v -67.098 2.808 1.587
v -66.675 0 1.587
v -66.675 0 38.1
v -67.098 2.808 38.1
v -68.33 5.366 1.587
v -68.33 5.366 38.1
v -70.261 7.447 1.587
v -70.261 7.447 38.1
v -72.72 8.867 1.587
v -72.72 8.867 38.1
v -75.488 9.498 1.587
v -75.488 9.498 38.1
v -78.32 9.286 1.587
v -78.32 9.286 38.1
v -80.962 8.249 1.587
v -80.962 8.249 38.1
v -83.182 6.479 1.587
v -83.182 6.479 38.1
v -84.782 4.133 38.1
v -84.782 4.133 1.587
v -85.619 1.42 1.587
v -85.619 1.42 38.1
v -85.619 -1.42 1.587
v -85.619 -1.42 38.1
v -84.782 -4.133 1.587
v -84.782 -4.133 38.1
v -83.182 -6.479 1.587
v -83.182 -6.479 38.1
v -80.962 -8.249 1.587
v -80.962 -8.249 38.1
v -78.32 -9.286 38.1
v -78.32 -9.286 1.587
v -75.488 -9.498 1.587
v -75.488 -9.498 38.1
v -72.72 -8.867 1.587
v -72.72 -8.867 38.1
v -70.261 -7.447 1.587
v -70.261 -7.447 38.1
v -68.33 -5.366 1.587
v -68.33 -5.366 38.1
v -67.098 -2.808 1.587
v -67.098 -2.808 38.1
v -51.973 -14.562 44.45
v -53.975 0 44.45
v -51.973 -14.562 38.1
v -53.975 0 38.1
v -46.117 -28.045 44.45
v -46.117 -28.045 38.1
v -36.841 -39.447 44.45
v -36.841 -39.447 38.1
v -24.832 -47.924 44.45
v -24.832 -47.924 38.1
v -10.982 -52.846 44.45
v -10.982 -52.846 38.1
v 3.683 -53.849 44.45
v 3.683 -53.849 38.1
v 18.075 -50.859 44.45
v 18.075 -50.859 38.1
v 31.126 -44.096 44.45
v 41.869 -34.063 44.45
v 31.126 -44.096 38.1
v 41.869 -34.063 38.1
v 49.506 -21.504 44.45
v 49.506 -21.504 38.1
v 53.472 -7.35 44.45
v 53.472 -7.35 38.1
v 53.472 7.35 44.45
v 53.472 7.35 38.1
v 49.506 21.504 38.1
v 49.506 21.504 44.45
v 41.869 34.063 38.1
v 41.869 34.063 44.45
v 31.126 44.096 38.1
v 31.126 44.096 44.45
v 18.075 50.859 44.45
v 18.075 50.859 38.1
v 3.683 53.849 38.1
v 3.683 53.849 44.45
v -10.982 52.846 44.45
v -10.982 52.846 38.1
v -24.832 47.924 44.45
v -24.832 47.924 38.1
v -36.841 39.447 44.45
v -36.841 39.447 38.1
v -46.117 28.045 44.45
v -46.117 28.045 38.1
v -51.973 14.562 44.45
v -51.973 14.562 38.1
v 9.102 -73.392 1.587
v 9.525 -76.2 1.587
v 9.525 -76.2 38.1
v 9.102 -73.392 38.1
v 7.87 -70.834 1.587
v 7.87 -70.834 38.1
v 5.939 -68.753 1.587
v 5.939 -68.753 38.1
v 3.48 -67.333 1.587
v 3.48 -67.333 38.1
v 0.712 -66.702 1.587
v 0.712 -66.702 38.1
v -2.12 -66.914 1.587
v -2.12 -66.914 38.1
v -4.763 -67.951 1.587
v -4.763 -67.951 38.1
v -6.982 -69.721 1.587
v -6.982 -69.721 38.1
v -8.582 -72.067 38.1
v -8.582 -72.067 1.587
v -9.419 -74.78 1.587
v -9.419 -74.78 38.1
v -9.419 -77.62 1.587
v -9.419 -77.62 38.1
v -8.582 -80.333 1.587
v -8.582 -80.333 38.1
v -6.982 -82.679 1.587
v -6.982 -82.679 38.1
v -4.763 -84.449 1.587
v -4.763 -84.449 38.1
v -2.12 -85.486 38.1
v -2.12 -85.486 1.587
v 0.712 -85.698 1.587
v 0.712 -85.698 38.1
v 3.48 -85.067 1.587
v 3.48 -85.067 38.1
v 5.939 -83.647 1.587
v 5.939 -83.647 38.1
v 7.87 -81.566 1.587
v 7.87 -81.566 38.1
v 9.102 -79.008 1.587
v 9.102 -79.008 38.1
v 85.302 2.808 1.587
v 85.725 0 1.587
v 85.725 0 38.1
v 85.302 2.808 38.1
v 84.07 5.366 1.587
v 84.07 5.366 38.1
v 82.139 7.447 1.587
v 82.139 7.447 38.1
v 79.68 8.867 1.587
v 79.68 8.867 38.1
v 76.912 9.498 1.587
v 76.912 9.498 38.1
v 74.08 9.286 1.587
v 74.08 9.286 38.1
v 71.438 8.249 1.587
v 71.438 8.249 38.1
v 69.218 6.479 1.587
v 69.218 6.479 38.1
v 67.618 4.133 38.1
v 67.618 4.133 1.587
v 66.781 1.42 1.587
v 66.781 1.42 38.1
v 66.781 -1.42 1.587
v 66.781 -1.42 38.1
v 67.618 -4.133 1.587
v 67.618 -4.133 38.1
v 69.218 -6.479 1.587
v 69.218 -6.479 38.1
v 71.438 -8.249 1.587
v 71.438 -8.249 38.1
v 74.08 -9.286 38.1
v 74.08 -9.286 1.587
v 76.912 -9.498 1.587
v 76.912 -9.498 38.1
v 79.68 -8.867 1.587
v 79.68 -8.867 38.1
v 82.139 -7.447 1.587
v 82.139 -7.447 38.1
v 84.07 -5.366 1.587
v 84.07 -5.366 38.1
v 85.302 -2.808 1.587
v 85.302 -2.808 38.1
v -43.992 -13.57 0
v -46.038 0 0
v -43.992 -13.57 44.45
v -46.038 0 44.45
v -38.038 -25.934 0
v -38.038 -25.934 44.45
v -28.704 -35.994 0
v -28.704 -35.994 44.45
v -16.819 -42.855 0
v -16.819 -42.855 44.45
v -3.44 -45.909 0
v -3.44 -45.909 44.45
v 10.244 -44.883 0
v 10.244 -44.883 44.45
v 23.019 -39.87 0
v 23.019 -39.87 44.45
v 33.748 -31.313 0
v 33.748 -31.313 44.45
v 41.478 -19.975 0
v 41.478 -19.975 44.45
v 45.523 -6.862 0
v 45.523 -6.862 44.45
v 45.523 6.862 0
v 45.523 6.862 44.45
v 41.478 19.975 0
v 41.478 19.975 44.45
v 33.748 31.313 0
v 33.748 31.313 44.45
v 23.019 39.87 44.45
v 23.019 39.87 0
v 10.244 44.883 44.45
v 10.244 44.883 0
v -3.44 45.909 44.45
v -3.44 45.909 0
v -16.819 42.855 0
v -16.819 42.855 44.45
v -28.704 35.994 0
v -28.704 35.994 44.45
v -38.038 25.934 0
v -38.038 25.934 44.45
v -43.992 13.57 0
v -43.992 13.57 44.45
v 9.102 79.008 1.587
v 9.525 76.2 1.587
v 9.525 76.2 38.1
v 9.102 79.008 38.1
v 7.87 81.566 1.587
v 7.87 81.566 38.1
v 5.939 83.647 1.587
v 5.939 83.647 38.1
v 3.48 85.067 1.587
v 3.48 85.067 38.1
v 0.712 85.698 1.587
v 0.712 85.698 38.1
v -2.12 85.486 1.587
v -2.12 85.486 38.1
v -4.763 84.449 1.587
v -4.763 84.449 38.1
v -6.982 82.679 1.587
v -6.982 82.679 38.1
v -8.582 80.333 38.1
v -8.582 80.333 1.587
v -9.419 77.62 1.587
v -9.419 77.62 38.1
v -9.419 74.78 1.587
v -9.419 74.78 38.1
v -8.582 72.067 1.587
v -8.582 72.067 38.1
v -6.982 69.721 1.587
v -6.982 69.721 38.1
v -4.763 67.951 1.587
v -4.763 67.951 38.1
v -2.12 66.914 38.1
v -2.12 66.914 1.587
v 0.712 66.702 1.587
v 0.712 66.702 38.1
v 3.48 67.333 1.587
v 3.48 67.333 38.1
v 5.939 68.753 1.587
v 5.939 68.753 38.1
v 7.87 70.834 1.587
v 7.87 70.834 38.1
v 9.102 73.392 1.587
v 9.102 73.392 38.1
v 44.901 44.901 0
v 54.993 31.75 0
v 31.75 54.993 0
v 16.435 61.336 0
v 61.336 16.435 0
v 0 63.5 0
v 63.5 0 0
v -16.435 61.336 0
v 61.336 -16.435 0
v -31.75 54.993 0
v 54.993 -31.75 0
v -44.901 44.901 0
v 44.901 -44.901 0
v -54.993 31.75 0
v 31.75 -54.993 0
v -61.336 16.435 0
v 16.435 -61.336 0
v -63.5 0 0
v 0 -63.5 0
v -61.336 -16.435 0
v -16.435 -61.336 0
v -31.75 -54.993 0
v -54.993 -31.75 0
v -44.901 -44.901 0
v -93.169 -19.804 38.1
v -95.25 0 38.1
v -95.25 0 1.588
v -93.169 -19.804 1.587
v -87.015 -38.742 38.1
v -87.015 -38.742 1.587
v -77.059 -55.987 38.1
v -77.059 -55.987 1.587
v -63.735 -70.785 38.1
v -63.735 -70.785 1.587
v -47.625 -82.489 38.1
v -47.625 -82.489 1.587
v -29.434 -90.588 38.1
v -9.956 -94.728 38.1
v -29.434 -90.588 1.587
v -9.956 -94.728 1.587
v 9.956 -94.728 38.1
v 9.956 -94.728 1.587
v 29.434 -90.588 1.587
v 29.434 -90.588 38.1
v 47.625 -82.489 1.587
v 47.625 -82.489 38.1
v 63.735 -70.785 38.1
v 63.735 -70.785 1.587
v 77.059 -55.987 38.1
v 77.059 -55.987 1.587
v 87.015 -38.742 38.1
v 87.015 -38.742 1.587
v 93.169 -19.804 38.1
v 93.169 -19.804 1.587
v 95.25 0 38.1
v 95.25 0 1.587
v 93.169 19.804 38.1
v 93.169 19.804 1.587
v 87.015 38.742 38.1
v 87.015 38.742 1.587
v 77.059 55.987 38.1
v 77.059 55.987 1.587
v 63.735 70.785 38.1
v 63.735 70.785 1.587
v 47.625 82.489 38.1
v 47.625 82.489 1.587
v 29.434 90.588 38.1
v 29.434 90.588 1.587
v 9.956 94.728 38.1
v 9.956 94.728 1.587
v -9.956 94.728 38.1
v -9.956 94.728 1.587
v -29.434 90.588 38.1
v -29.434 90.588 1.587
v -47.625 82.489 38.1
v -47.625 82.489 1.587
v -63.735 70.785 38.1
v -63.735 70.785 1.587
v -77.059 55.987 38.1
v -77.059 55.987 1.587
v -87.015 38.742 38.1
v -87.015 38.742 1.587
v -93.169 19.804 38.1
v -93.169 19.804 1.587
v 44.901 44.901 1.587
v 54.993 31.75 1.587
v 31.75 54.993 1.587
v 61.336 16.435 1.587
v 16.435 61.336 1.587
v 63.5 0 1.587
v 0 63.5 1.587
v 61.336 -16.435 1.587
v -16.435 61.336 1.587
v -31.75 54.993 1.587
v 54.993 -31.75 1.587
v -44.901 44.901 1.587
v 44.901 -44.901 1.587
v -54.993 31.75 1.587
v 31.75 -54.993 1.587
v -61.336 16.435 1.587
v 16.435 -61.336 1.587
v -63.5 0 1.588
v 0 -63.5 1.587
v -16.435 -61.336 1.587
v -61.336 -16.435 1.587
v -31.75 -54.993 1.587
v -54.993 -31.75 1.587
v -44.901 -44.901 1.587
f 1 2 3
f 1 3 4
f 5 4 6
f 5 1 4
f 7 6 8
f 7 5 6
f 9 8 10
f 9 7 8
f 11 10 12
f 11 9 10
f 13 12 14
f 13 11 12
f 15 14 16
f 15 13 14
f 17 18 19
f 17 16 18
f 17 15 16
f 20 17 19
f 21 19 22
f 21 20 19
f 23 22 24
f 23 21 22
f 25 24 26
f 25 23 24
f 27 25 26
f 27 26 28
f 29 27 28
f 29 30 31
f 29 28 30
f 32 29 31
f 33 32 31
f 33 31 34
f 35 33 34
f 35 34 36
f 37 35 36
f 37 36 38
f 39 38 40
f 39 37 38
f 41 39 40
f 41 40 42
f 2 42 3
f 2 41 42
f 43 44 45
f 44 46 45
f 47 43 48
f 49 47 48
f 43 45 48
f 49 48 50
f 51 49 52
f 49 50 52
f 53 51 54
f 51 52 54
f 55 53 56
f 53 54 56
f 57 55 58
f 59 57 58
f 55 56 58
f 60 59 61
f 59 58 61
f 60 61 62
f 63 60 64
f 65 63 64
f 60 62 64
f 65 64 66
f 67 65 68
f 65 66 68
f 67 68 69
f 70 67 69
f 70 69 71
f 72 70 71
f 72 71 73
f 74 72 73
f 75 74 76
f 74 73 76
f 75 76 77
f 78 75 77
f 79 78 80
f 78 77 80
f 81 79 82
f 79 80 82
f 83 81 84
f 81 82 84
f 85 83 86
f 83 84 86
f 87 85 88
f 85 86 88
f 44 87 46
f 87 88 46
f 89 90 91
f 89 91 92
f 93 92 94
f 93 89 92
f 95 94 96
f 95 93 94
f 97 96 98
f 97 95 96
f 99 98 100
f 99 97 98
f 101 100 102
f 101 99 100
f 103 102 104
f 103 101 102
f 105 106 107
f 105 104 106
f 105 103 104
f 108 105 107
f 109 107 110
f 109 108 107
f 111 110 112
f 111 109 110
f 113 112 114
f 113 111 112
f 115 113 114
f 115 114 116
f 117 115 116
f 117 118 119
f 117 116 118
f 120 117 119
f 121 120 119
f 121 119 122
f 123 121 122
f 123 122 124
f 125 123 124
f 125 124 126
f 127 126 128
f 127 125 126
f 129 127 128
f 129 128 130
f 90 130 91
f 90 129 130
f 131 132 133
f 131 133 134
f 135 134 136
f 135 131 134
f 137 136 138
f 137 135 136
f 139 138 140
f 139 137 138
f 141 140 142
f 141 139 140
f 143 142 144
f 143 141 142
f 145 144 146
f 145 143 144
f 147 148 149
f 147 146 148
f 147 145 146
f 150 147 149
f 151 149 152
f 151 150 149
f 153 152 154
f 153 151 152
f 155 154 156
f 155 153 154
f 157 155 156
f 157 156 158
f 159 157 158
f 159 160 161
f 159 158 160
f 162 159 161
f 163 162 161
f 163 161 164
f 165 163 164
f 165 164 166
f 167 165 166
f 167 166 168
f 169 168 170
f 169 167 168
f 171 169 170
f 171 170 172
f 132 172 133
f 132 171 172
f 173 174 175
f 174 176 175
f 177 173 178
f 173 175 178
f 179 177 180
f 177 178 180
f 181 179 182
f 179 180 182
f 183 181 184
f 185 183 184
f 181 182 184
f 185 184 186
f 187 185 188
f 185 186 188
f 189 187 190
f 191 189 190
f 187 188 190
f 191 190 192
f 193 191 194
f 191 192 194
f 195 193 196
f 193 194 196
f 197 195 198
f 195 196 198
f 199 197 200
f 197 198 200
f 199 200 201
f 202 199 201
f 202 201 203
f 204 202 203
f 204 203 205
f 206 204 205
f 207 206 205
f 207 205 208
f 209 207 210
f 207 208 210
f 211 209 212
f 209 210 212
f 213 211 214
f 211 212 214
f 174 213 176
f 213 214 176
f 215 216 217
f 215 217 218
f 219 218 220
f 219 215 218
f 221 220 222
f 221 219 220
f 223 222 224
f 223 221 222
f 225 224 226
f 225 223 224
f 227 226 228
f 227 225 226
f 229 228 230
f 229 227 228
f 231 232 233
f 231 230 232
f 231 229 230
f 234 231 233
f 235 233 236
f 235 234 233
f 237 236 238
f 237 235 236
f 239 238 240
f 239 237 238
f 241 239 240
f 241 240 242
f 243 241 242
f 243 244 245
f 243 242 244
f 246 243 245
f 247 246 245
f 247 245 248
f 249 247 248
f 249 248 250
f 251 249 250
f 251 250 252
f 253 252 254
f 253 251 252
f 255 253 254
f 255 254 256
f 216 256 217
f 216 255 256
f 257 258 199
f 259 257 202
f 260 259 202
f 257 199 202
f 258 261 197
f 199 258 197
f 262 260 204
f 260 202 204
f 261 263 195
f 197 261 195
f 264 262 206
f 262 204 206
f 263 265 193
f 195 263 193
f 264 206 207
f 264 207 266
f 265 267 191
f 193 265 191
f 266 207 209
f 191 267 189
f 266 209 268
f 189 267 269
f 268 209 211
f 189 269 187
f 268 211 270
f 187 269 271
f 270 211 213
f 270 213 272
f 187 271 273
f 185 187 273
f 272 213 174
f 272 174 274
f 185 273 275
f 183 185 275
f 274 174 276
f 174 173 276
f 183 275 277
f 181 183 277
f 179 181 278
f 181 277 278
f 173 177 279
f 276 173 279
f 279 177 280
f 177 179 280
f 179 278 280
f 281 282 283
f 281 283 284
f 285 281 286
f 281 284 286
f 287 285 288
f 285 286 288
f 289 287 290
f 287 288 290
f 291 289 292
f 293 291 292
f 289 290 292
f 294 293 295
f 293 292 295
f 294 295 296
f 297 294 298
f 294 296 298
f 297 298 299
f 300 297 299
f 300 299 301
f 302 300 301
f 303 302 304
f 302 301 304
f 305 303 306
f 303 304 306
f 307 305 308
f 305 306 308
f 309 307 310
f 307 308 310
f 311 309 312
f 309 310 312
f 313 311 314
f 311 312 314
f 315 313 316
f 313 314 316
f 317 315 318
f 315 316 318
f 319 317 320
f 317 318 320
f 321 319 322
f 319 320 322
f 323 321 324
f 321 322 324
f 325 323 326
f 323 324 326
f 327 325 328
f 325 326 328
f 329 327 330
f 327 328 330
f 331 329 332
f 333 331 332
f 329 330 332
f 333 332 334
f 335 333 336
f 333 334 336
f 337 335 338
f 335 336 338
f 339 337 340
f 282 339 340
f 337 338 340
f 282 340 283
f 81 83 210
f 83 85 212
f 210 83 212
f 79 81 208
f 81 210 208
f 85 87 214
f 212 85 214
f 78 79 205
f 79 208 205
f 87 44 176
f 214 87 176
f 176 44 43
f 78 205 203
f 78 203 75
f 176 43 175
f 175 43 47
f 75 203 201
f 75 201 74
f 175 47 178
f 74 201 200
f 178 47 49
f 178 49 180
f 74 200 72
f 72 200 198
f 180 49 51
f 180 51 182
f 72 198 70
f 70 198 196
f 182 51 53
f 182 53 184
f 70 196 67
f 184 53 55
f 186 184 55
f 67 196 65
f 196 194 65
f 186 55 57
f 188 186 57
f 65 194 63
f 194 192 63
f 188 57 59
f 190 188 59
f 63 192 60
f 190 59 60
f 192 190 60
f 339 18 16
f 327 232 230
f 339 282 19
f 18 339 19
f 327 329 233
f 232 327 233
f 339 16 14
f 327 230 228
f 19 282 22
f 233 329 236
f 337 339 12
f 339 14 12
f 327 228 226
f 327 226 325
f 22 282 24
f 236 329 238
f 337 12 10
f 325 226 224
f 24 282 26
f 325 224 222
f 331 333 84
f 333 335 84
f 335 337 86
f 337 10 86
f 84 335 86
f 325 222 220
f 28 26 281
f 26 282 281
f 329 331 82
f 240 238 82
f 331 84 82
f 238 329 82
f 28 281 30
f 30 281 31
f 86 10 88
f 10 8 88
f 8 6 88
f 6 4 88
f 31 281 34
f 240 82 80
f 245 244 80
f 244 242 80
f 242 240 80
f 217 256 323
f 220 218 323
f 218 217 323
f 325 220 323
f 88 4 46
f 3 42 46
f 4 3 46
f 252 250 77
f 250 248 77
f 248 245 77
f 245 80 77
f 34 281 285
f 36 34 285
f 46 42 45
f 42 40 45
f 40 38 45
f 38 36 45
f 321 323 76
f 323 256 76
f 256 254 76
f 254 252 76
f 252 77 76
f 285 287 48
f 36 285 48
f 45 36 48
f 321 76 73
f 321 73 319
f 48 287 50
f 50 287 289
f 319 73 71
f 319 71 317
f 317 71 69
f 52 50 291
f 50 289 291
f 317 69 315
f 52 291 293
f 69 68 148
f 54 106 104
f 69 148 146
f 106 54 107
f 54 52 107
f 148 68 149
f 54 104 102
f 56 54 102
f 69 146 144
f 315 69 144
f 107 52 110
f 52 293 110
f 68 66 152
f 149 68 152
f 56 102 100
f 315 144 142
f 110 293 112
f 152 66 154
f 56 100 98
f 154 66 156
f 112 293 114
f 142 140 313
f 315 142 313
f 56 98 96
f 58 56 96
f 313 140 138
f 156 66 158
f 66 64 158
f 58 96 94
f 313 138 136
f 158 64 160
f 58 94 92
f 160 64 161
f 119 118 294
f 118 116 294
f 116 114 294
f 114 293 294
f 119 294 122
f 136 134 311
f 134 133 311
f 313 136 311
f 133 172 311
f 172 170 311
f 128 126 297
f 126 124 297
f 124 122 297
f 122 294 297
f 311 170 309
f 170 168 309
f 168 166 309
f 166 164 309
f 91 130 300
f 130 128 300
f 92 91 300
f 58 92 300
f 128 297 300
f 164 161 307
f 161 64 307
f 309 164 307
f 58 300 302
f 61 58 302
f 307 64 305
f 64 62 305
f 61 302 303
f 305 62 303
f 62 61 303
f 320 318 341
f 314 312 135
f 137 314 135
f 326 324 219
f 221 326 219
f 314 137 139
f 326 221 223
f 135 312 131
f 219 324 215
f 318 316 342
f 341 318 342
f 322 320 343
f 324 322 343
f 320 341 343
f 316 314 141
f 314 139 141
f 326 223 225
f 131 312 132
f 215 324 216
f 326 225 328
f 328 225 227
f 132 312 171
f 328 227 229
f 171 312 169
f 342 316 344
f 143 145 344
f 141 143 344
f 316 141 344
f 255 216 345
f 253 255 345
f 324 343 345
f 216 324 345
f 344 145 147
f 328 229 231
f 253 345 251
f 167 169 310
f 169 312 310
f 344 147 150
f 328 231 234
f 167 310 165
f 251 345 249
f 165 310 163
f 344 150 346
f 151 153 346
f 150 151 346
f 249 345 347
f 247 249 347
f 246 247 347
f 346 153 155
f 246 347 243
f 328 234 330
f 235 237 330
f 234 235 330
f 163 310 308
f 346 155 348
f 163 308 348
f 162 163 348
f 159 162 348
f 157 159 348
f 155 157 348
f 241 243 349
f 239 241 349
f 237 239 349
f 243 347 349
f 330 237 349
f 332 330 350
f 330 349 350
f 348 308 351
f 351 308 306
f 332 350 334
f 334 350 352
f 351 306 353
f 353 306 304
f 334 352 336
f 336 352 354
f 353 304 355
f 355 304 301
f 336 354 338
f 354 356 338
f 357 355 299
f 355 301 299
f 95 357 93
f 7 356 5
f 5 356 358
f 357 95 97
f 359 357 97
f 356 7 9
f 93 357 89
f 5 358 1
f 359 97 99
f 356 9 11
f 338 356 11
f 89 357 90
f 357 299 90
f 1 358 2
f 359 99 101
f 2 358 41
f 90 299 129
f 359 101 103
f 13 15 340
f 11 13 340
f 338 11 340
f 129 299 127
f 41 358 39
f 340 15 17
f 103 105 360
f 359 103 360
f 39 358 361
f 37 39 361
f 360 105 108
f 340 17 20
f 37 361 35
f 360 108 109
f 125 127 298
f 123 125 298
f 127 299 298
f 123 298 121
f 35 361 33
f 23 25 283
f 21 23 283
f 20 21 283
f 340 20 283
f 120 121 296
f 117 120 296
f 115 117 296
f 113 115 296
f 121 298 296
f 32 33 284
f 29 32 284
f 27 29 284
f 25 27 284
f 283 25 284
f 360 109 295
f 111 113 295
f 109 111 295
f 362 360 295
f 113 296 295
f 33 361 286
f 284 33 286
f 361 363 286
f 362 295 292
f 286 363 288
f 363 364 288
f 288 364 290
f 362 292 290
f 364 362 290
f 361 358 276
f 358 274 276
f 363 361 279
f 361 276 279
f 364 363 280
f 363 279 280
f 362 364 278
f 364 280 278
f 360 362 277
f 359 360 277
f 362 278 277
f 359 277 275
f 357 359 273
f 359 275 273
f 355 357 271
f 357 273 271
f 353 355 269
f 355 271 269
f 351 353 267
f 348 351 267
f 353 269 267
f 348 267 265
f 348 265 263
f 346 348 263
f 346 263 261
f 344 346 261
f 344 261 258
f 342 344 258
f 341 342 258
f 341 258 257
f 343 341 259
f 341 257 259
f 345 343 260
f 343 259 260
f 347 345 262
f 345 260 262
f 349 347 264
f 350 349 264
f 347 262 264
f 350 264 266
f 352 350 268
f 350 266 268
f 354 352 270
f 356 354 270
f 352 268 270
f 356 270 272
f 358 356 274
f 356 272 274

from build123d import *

# Parameters (mm, degrees)
F2_R     = 9.525
F3_DEPTH = 44.451


with BuildPart() as f1:
    # F0 (on Front) → F1 (revolve)
    with BuildSketch(Plane.XZ):
        Polygon((-63.5, 0), (-46.0375, 0), (-46.0375, 44.45), (-53.975, 44.45), (-53.975, 38.1), (-95.25, 38.1), (-95.25, 1.5875), (-63.5, 1.5875), align=None)
    revolve(axis=Axis((0, 0, 22.225), (0, 0, 1)))

    # F2 (on Top) → F3 (cut, through all)
    with BuildSketch(Plane.XY):
        with Locations((76.2, 0)):
            Circle(F2_R)
        with Locations((0, 76.2)):
            Circle(F2_R)
        with Locations((-76.2, 0)):
            Circle(F2_R)
        with Locations((0, -76.2)):
            Circle(F2_R)
    extrude(amount=F3_DEPTH, mode=Mode.SUBTRACT)


solid = f1.part
